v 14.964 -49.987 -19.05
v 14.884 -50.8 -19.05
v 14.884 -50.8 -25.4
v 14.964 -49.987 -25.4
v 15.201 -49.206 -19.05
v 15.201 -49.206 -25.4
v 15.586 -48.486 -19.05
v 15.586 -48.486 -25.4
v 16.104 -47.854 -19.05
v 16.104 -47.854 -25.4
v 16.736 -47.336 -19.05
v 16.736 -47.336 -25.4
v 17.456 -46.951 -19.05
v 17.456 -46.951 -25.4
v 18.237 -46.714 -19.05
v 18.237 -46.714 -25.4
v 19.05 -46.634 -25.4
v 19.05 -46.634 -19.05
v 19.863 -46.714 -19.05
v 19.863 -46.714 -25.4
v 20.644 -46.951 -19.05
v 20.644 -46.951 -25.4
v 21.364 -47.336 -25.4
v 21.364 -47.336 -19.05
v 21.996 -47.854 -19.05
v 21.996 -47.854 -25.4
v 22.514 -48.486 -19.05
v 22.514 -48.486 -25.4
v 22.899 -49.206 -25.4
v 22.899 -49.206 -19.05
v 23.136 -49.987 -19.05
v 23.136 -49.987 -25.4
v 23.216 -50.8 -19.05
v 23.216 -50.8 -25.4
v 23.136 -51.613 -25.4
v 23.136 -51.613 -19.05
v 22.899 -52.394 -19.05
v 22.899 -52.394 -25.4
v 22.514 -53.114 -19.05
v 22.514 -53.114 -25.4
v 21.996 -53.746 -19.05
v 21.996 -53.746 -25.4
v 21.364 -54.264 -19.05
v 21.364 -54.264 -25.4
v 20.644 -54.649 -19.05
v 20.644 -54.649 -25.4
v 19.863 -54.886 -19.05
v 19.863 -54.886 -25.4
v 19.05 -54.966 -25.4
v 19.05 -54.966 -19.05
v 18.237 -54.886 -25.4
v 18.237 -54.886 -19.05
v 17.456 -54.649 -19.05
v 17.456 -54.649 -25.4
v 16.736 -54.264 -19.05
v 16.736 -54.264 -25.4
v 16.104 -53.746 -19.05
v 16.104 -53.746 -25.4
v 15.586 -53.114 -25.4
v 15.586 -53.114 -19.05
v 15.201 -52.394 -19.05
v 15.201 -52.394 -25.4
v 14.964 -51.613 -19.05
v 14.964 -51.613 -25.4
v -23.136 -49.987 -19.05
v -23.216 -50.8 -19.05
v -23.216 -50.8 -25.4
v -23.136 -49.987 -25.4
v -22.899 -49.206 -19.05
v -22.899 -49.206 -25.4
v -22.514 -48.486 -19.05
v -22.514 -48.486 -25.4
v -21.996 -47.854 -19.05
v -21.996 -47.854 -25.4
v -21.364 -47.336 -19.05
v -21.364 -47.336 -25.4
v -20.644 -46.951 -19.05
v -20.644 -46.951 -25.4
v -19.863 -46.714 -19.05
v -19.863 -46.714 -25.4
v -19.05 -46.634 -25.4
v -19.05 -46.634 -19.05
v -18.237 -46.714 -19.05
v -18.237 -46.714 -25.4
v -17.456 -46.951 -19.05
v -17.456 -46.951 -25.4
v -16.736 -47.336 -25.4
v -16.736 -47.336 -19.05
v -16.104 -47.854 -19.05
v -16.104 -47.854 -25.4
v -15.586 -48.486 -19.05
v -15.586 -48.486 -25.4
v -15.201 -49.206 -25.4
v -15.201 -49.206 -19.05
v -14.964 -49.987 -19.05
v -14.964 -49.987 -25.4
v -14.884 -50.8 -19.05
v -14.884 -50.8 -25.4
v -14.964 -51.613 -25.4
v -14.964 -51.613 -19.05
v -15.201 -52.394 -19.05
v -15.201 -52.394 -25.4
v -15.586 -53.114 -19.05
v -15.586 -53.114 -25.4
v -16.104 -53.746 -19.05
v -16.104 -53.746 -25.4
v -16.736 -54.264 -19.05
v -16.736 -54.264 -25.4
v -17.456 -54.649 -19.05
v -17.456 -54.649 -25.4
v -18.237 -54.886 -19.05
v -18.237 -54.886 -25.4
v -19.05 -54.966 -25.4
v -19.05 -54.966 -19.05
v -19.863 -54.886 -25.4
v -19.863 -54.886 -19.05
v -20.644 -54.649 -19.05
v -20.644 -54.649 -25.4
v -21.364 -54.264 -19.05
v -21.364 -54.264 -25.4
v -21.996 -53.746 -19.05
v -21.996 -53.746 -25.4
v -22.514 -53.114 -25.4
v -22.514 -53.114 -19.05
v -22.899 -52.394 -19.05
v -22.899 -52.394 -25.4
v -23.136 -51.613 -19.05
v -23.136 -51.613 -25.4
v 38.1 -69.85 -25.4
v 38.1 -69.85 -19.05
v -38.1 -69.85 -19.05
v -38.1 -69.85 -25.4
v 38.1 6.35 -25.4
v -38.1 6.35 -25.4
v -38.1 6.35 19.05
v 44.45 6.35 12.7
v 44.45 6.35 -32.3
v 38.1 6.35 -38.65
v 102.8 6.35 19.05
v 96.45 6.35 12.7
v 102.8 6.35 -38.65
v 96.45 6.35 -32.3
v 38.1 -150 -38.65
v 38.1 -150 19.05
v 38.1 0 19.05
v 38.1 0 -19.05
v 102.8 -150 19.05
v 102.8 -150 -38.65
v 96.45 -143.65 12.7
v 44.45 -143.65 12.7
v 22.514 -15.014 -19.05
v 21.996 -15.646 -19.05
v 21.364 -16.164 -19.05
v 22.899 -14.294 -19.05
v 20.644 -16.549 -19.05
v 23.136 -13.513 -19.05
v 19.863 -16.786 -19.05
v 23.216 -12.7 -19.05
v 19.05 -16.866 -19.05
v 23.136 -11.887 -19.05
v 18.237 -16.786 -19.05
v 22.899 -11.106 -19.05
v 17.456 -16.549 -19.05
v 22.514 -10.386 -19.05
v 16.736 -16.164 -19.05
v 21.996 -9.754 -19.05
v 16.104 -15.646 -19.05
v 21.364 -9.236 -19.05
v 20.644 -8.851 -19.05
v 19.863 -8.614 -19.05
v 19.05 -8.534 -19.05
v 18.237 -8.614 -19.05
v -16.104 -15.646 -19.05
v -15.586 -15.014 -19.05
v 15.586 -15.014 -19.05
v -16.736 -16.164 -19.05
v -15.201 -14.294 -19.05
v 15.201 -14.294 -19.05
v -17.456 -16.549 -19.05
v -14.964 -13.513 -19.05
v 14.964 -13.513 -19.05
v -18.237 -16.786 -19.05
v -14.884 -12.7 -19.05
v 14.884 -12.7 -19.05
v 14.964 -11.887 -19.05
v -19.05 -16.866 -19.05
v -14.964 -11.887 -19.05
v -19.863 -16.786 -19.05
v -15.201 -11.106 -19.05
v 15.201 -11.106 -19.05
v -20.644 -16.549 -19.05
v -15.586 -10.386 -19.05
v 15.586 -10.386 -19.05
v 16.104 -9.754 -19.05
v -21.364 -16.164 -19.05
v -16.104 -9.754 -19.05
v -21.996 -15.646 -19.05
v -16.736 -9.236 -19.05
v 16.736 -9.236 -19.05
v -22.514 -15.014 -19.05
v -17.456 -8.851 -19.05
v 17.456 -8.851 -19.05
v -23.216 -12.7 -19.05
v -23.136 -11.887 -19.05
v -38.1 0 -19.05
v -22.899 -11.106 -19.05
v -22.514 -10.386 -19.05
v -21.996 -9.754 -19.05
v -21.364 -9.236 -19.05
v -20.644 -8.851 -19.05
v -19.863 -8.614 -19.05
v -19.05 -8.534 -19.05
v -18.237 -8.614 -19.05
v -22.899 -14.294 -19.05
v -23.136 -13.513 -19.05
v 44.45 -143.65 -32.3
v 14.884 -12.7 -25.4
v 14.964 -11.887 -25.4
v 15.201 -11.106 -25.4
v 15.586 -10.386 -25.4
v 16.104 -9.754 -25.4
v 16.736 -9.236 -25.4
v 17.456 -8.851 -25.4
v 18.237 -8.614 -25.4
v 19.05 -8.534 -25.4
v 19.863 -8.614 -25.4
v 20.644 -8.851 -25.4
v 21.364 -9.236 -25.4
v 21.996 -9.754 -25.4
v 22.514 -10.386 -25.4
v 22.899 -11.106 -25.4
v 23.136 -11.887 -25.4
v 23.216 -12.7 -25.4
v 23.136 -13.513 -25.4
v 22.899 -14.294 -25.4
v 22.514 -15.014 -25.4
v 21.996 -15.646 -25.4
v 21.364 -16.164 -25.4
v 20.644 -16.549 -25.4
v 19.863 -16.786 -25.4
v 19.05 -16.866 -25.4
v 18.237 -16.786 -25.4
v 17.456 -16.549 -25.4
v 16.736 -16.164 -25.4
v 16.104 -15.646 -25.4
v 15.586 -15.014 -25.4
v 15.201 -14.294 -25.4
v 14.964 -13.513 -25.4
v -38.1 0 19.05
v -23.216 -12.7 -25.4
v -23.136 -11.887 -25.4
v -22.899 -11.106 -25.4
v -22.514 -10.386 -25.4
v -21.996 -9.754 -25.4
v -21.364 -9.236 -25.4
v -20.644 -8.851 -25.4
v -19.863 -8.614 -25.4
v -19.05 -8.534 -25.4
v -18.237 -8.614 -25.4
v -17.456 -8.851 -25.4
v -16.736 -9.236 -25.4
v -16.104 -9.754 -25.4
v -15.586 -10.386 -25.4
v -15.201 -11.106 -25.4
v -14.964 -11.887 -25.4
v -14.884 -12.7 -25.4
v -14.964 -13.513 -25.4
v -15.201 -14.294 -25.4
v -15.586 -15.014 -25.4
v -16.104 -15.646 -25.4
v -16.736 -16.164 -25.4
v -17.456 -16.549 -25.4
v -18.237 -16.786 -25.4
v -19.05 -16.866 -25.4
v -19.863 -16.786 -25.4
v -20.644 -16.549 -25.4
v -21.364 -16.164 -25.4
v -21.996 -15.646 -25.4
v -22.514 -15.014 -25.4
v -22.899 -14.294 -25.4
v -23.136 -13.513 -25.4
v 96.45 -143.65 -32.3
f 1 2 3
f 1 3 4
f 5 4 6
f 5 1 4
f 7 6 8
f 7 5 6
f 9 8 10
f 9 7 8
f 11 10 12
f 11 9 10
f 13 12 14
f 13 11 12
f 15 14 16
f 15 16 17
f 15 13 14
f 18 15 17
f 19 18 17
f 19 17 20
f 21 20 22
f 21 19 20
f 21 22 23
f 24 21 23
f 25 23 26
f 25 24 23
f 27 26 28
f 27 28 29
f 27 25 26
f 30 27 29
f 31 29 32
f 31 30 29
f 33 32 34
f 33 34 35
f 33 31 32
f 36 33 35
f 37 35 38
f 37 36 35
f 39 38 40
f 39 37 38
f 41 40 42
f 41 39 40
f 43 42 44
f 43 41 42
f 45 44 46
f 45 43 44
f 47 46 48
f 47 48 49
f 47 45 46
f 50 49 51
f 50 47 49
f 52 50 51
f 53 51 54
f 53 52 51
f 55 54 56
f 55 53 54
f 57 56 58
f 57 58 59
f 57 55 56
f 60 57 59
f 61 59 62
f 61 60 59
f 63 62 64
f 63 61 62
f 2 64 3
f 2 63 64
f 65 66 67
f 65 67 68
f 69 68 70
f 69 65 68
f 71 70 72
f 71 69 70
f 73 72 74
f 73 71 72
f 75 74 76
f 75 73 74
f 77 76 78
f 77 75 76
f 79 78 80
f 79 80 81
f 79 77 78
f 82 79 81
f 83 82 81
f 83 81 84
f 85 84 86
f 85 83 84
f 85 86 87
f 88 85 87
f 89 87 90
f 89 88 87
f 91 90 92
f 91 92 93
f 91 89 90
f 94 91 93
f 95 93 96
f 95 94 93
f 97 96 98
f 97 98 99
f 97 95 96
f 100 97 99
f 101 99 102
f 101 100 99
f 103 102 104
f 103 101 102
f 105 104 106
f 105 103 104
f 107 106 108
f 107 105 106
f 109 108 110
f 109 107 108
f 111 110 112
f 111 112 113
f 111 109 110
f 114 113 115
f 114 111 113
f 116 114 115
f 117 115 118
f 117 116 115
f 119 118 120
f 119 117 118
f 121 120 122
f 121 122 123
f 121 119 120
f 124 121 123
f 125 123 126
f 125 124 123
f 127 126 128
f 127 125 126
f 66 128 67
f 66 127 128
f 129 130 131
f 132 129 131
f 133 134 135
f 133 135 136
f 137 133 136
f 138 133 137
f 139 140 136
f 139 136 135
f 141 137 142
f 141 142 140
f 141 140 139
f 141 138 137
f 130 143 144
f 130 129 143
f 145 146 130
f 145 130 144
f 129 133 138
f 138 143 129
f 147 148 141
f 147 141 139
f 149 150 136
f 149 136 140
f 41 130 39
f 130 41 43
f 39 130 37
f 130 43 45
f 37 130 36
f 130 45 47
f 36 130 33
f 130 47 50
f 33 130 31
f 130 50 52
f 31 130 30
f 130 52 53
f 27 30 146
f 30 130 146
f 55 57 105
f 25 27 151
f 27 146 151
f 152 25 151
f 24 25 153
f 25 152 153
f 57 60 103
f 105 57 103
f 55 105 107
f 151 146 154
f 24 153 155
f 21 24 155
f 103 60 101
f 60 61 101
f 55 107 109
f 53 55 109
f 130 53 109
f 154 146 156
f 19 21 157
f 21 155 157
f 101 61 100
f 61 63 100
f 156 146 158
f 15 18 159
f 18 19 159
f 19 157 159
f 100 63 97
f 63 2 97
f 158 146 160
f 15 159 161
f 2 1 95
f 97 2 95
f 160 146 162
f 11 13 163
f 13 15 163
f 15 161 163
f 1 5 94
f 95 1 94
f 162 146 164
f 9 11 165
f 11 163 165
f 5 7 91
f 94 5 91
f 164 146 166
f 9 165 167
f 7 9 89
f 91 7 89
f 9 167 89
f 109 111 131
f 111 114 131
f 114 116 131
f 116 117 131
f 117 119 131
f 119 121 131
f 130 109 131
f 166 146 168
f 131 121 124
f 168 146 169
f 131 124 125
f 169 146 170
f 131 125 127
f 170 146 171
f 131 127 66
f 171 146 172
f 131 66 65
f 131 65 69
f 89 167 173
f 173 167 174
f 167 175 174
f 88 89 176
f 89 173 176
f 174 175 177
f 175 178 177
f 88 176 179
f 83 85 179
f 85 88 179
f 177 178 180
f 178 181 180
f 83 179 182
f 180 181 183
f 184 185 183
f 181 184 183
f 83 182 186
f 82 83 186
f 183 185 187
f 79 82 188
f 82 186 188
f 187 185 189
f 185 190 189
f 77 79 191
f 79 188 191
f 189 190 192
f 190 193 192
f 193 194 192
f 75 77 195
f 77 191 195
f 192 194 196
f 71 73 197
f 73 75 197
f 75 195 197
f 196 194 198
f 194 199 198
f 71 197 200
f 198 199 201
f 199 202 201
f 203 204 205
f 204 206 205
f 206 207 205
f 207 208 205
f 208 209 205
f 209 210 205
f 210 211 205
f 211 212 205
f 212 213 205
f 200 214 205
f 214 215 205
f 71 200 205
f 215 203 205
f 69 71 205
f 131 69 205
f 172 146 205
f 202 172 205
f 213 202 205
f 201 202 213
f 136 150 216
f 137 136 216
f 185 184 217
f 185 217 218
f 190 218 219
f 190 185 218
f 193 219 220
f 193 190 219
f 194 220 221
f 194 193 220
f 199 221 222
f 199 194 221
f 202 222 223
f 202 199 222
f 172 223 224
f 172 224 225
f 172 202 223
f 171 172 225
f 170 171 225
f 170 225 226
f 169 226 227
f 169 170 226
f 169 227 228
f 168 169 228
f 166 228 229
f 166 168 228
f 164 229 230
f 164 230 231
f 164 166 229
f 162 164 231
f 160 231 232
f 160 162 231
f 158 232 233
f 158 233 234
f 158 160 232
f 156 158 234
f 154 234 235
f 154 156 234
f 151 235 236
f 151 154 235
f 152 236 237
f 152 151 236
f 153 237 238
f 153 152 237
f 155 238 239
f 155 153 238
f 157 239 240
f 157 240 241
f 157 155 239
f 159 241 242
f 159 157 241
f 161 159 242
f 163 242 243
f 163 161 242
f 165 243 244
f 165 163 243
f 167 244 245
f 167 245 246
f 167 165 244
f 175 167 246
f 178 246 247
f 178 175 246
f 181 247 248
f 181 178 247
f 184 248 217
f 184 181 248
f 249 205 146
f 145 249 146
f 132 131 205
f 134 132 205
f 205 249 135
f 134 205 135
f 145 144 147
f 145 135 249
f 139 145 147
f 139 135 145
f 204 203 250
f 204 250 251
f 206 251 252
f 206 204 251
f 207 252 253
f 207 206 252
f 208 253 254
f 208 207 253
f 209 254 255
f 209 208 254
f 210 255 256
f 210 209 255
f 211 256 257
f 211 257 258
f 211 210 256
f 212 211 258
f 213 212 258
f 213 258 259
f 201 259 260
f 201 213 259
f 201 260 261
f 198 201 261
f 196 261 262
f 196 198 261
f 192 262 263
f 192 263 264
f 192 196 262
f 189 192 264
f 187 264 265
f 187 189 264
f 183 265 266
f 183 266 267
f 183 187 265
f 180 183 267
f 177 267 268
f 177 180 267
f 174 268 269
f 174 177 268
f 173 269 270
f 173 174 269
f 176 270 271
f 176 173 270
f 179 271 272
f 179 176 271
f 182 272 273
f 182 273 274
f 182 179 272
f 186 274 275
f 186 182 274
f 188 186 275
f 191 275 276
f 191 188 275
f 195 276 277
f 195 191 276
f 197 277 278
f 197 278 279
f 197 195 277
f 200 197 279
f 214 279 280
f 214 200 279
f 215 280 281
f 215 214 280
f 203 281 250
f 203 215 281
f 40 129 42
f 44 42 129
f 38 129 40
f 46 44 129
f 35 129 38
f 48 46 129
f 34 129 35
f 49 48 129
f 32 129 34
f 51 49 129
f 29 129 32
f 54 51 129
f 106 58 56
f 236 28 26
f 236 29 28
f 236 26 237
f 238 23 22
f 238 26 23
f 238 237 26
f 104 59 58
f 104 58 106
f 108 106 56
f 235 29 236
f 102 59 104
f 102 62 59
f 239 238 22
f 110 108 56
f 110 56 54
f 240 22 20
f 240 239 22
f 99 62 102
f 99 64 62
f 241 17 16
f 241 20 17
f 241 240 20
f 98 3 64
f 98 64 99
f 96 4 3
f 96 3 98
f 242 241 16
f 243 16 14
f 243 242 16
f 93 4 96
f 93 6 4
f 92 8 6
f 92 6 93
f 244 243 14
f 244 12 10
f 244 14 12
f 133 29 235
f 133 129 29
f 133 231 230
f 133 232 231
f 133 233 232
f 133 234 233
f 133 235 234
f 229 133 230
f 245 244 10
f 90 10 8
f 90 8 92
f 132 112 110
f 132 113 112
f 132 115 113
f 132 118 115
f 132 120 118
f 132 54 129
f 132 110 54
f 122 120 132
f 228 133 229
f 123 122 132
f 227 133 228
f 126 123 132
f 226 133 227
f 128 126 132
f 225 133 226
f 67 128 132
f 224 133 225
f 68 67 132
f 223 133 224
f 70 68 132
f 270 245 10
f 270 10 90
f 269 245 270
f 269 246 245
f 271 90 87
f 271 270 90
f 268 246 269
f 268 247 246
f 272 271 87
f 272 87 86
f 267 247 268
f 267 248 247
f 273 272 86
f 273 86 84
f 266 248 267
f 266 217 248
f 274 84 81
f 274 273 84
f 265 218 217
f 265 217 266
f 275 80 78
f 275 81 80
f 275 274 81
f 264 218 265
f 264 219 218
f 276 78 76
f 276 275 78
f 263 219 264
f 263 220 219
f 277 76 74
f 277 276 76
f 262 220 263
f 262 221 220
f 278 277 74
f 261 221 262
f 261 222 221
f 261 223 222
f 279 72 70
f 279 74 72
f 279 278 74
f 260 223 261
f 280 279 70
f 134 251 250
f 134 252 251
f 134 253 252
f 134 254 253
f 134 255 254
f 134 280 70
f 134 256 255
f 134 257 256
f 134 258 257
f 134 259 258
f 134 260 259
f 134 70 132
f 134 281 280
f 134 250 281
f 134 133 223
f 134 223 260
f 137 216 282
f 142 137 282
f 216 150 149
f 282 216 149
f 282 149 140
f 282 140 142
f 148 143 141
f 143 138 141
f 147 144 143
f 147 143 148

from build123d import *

# Parameters (mm, degrees)
SKETCH1_W           = 76.2
SKETCH1_H           = 38.1
BOSS_EXTRUDE1_DEPTH = 6.35
SKETCH2_W           = 76.2
SKETCH2_H           = 76.2
SKETCH2_R           = 4.1656
BOSS_EXTRUDE2_DEPTH = 6.35
SKETCH3_W           = 64.7
SKETCH3_H           = 57.7
SKETCH3_W_2         = 52
SKETCH3_H_2         = 45
BOSS_EXTRUDE3_DEPTH = 150
SKETCH4_W           = 64.7
SKETCH4_H           = 57.7
BOSS_EXTRUDE4_DEPTH = 6.35


with BuildPart() as part:
    # Sketch1 → Boss-Extrude1 (new body)
    with BuildSketch(Plane(origin=(0, 0, 0), x_dir=(1, 0, 0), z_dir=(0, 1, 0))):
        Rectangle(SKETCH1_W, SKETCH1_H)
    extrude(amount=BOSS_EXTRUDE1_DEPTH)

    # Sketch2 → Boss-Extrude2 (add)
    with BuildSketch(Plane(origin=(0, 0, -19.05), x_dir=(-1, 0, 0), z_dir=(0, 0, -1))):
        with Locations((0, -31.75)):
            Rectangle(SKETCH2_W, SKETCH2_H)
        with Locations((-19.05, -12.7)):
            Circle(SKETCH2_R, mode=Mode.SUBTRACT)
        with Locations((19.05, -12.7)):
            Circle(SKETCH2_R, mode=Mode.SUBTRACT)
        with Locations((19.05, -50.8)):
            Circle(SKETCH2_R, mode=Mode.SUBTRACT)
        with Locations((-19.05, -50.8)):
            Circle(SKETCH2_R, mode=Mode.SUBTRACT)
    extrude(amount=BOSS_EXTRUDE2_DEPTH)

    # Sketch3 → Boss-Extrude3 (add)
    with BuildSketch(Plane(origin=(0, 6.35, 0), x_dir=(1, 0, 0), z_dir=(0, 1, 0))):
        with Locations((70.45, 9.8)):
            Rectangle(SKETCH3_W, SKETCH3_H)
        with Locations((70.45, 9.8)):
            Rectangle(SKETCH3_W_2, SKETCH3_H_2, mode=Mode.SUBTRACT)
    extrude(amount=-BOSS_EXTRUDE3_DEPTH)

    # Sketch4 → Boss-Extrude4 (add)
    with BuildSketch(Plane.XZ.offset(143.65)):
        with Locations((70.45, -9.8)):
            Rectangle(SKETCH4_W, SKETCH4_H)
    extrude(amount=BOSS_EXTRUDE4_DEPTH)


solid = part.part
